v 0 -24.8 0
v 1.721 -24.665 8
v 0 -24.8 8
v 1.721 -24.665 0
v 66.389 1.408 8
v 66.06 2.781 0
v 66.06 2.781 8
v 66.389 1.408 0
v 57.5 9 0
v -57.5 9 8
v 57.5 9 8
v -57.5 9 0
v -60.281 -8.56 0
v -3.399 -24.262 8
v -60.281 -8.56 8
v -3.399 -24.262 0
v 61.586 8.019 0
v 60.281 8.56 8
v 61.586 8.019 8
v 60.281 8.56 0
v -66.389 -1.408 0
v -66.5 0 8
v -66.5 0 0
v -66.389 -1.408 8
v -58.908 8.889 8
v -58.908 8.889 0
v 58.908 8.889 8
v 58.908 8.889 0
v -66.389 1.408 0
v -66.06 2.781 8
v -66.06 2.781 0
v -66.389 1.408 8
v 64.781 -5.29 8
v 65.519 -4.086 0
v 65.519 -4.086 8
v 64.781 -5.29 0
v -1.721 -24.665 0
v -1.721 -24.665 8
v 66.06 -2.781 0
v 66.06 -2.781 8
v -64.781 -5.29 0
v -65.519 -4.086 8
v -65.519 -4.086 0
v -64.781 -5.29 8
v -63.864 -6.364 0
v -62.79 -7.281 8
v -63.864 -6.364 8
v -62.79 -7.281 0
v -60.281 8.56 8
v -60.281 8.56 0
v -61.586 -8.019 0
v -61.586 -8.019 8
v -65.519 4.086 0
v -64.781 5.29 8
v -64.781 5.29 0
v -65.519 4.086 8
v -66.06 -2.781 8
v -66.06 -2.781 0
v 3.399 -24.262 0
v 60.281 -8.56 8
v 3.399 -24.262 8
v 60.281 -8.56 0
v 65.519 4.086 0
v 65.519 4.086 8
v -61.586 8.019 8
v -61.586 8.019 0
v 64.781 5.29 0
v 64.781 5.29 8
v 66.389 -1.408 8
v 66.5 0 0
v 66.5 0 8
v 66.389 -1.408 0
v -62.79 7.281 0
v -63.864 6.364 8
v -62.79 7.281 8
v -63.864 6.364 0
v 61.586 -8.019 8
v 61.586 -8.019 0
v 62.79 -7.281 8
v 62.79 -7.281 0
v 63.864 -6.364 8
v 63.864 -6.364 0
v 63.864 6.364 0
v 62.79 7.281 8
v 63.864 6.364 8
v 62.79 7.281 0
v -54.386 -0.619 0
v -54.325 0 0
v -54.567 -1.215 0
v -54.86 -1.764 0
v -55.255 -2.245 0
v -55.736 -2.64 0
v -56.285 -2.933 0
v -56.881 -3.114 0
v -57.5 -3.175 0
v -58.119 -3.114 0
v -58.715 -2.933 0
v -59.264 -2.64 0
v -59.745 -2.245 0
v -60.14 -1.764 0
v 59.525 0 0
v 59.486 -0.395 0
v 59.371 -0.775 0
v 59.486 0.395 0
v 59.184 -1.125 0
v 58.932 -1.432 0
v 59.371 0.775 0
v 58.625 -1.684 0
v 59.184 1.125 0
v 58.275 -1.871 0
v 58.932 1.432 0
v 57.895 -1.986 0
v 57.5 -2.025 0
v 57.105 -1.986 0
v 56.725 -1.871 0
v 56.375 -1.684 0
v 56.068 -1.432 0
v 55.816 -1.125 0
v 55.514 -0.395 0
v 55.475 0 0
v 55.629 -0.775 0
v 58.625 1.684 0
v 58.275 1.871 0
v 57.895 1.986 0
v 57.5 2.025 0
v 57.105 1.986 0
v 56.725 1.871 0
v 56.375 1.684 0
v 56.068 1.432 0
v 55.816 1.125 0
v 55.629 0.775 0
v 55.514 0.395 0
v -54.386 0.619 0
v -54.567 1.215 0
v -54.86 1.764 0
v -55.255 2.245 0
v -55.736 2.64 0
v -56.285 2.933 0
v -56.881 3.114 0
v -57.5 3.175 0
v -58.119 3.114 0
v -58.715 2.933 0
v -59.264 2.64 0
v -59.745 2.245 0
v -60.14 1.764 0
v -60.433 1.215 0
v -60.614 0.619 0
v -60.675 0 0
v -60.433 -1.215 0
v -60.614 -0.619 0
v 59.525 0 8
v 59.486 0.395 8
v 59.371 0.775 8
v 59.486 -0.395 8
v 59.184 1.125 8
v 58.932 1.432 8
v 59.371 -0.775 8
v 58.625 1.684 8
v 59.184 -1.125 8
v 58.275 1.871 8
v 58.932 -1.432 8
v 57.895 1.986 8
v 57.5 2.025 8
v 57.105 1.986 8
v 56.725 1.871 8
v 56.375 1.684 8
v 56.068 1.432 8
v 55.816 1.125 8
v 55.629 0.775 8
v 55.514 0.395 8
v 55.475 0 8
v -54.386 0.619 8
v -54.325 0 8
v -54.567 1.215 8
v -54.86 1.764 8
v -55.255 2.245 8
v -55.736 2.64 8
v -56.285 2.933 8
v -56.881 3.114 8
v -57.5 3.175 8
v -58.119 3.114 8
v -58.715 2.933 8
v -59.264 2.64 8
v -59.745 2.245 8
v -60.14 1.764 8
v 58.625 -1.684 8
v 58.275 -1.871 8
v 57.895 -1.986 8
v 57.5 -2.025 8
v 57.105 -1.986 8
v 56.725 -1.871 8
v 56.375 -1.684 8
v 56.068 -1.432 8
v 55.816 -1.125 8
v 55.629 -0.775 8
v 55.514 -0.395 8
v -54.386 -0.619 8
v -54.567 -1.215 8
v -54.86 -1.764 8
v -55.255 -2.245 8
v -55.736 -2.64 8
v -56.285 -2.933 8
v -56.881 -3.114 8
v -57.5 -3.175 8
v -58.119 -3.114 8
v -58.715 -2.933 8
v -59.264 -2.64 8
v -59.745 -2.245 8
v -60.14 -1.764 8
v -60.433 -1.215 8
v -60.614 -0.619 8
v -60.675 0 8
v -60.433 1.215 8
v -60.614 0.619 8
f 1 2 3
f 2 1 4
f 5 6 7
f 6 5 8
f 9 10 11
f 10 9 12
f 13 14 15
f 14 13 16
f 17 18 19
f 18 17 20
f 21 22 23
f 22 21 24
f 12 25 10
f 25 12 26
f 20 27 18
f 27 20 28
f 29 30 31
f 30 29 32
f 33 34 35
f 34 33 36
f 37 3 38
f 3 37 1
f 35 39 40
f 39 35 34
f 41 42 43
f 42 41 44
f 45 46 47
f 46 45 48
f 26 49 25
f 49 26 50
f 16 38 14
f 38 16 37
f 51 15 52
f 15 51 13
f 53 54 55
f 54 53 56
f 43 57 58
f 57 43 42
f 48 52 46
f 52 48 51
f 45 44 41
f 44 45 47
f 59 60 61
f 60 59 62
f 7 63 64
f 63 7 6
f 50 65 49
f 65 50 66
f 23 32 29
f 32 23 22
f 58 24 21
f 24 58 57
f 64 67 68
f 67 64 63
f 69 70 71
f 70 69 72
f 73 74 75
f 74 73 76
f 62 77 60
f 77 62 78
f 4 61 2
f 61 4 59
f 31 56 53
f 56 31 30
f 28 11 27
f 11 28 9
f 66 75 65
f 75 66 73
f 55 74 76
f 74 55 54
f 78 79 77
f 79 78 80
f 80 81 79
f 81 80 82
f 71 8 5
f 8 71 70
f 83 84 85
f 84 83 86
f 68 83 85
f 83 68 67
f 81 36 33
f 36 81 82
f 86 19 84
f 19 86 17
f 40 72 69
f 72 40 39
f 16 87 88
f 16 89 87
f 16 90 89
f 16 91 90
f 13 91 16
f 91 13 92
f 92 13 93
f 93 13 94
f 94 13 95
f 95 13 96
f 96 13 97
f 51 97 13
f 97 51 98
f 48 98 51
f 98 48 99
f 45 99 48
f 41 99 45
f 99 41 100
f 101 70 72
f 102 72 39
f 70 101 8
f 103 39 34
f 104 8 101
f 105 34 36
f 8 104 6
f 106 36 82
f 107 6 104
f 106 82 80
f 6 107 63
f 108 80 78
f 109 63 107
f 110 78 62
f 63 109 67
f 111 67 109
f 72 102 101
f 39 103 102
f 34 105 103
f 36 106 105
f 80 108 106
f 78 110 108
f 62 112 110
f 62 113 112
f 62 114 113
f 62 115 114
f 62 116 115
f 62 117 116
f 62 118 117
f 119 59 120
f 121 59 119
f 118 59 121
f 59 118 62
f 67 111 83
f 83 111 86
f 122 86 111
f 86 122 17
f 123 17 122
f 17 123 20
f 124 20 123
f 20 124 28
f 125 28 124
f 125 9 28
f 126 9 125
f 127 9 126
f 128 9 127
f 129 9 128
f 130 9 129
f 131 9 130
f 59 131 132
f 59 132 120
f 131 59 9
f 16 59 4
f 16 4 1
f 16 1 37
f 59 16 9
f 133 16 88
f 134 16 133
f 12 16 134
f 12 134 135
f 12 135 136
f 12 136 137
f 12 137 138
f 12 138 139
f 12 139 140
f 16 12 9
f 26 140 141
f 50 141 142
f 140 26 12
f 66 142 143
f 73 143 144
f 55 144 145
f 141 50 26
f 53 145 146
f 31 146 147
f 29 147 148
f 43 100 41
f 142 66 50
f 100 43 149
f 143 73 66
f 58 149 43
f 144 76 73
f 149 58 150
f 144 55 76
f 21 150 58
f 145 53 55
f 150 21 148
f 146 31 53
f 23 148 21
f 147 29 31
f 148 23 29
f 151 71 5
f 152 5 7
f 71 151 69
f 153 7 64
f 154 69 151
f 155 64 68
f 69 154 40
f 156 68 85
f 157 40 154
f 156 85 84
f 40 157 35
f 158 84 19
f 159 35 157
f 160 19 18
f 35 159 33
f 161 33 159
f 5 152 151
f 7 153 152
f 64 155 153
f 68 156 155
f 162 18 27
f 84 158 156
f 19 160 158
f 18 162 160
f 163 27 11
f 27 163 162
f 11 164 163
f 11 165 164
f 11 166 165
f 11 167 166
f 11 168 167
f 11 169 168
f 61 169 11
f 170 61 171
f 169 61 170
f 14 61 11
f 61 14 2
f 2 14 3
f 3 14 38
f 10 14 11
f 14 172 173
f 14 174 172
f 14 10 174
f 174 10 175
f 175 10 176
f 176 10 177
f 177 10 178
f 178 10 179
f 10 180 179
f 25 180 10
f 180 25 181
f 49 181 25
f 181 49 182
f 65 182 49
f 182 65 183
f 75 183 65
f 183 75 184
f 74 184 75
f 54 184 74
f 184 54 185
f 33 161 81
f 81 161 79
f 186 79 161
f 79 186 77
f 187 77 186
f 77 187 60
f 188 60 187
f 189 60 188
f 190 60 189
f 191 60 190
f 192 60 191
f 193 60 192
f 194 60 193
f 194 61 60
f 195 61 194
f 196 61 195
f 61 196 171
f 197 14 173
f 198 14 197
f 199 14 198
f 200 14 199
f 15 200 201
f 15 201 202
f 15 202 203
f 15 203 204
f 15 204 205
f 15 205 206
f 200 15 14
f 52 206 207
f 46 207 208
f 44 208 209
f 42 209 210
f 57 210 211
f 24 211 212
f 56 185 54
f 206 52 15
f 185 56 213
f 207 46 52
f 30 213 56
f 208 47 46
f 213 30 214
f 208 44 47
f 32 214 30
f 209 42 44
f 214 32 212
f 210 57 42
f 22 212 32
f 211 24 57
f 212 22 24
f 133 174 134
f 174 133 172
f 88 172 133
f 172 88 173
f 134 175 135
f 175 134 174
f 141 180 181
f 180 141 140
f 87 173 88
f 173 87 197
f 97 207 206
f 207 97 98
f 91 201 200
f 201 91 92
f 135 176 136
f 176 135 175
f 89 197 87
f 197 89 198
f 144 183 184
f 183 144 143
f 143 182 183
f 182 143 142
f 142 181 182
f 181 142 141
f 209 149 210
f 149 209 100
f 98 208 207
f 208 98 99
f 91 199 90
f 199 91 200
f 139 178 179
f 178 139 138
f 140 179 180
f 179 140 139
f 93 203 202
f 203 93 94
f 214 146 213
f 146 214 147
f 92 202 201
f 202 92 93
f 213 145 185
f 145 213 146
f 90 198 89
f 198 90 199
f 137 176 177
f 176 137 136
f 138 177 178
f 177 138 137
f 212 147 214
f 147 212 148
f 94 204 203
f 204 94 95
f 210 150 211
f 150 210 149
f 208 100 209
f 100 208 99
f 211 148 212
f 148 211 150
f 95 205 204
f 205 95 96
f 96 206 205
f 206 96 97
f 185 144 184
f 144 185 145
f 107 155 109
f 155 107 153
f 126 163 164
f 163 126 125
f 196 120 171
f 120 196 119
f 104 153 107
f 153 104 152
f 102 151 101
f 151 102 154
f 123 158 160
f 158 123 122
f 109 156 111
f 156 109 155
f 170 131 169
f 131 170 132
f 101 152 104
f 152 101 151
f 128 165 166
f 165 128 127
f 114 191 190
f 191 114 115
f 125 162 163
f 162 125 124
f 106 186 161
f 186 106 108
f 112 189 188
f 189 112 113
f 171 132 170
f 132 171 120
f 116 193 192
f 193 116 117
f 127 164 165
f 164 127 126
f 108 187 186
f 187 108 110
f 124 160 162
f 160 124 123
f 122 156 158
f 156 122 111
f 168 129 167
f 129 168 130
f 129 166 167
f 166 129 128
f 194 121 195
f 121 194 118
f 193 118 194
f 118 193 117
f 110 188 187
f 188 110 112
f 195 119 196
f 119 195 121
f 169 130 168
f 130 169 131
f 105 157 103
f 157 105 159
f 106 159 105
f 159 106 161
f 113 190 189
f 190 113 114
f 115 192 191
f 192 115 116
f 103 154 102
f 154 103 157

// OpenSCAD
$fn = 32;

// ----------------------------------------------------------------------
// Lever: 115 mm between the bosses, 8 mm thick, smooth outline
// ----------------------------------------------------------------------

// --- parameters (mm) ---
lever_l = 115;            // distance between the boss centres
boss_a = 18;              // first boss diameter
boss_b = 18;              // second boss diameter
bore_a = 6.35;            // first bore
bore_b = 4.05;            // second bore
lever_t = 8;              // lever thickness
boss_c = 22;              // middle boss diameter
bend = 13.8;              // how far the middle boss drops

lever_profile = [[-66.5, 0], [-66.389, -1.408], [-66.06, -2.781], [-65.519, -4.086], [-64.781, -5.29], [-63.864, -6.364], [-62.79, -7.281], [-61.586, -8.019], [-60.281, -8.56], [-3.399, -24.262], [-1.721, -24.665], [0, -24.8], [1.721, -24.665], [3.399, -24.262], [60.281, -8.56], [61.586, -8.019], [62.79, -7.281], [63.864, -6.364], [64.781, -5.29], [65.519, -4.086], [66.06, -2.781], [66.389, -1.408], [66.5, 0], [66.389, 1.408], [66.06, 2.781], [65.519, 4.086], [64.781, 5.29], [63.864, 6.364], [62.79, 7.281], [61.586, 8.019], [60.281, 8.56], [58.908, 8.889], [57.5, 9], [-57.5, 9], [-58.908, 8.889], [-60.281, 8.56], [-61.586, 8.019], [-62.79, 7.281], [-63.864, 6.364], [-64.781, 5.29], [-65.519, 4.086], [-66.06, 2.781], [-66.389, 1.408]];

difference() {
  linear_extrude(height = lever_t) polygon(lever_profile);
  translate([-57.5, 0, -2.5]) cylinder(h = lever_t + 5, d = bore_a);
  translate([57.5, 0, -2.5]) cylinder(h = lever_t + 5, d = bore_b);
}
